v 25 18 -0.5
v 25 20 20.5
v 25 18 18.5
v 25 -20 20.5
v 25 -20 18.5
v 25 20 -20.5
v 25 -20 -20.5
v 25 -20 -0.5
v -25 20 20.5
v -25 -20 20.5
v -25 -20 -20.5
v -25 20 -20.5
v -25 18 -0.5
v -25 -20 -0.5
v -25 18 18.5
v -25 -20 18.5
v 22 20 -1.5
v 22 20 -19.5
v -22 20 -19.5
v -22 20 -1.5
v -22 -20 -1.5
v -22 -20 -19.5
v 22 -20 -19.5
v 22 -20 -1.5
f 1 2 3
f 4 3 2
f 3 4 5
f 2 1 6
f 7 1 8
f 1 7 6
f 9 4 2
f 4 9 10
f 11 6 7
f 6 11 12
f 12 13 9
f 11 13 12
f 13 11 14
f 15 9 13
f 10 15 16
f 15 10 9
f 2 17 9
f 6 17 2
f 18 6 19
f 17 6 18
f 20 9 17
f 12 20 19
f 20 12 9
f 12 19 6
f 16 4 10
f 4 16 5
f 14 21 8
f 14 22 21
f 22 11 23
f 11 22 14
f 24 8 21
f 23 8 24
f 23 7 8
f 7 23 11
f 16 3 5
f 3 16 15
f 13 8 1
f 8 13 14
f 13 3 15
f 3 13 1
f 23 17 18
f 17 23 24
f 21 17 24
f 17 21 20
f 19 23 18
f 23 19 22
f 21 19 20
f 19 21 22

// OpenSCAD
width = 50;
depth = 40;
height = 41;

table_thickness = 19;

camera_height = 18;

difference() {
    cube([width, depth, height], center=true);
    translate([0, -2, height/2 - table_thickness/2 - 2])
        #cube([width, depth, 19], center=true);
    translate([0, 0, -height/2 + camera_height/2 + 1])
        #cube([44, depth, camera_height], center=true);
}
